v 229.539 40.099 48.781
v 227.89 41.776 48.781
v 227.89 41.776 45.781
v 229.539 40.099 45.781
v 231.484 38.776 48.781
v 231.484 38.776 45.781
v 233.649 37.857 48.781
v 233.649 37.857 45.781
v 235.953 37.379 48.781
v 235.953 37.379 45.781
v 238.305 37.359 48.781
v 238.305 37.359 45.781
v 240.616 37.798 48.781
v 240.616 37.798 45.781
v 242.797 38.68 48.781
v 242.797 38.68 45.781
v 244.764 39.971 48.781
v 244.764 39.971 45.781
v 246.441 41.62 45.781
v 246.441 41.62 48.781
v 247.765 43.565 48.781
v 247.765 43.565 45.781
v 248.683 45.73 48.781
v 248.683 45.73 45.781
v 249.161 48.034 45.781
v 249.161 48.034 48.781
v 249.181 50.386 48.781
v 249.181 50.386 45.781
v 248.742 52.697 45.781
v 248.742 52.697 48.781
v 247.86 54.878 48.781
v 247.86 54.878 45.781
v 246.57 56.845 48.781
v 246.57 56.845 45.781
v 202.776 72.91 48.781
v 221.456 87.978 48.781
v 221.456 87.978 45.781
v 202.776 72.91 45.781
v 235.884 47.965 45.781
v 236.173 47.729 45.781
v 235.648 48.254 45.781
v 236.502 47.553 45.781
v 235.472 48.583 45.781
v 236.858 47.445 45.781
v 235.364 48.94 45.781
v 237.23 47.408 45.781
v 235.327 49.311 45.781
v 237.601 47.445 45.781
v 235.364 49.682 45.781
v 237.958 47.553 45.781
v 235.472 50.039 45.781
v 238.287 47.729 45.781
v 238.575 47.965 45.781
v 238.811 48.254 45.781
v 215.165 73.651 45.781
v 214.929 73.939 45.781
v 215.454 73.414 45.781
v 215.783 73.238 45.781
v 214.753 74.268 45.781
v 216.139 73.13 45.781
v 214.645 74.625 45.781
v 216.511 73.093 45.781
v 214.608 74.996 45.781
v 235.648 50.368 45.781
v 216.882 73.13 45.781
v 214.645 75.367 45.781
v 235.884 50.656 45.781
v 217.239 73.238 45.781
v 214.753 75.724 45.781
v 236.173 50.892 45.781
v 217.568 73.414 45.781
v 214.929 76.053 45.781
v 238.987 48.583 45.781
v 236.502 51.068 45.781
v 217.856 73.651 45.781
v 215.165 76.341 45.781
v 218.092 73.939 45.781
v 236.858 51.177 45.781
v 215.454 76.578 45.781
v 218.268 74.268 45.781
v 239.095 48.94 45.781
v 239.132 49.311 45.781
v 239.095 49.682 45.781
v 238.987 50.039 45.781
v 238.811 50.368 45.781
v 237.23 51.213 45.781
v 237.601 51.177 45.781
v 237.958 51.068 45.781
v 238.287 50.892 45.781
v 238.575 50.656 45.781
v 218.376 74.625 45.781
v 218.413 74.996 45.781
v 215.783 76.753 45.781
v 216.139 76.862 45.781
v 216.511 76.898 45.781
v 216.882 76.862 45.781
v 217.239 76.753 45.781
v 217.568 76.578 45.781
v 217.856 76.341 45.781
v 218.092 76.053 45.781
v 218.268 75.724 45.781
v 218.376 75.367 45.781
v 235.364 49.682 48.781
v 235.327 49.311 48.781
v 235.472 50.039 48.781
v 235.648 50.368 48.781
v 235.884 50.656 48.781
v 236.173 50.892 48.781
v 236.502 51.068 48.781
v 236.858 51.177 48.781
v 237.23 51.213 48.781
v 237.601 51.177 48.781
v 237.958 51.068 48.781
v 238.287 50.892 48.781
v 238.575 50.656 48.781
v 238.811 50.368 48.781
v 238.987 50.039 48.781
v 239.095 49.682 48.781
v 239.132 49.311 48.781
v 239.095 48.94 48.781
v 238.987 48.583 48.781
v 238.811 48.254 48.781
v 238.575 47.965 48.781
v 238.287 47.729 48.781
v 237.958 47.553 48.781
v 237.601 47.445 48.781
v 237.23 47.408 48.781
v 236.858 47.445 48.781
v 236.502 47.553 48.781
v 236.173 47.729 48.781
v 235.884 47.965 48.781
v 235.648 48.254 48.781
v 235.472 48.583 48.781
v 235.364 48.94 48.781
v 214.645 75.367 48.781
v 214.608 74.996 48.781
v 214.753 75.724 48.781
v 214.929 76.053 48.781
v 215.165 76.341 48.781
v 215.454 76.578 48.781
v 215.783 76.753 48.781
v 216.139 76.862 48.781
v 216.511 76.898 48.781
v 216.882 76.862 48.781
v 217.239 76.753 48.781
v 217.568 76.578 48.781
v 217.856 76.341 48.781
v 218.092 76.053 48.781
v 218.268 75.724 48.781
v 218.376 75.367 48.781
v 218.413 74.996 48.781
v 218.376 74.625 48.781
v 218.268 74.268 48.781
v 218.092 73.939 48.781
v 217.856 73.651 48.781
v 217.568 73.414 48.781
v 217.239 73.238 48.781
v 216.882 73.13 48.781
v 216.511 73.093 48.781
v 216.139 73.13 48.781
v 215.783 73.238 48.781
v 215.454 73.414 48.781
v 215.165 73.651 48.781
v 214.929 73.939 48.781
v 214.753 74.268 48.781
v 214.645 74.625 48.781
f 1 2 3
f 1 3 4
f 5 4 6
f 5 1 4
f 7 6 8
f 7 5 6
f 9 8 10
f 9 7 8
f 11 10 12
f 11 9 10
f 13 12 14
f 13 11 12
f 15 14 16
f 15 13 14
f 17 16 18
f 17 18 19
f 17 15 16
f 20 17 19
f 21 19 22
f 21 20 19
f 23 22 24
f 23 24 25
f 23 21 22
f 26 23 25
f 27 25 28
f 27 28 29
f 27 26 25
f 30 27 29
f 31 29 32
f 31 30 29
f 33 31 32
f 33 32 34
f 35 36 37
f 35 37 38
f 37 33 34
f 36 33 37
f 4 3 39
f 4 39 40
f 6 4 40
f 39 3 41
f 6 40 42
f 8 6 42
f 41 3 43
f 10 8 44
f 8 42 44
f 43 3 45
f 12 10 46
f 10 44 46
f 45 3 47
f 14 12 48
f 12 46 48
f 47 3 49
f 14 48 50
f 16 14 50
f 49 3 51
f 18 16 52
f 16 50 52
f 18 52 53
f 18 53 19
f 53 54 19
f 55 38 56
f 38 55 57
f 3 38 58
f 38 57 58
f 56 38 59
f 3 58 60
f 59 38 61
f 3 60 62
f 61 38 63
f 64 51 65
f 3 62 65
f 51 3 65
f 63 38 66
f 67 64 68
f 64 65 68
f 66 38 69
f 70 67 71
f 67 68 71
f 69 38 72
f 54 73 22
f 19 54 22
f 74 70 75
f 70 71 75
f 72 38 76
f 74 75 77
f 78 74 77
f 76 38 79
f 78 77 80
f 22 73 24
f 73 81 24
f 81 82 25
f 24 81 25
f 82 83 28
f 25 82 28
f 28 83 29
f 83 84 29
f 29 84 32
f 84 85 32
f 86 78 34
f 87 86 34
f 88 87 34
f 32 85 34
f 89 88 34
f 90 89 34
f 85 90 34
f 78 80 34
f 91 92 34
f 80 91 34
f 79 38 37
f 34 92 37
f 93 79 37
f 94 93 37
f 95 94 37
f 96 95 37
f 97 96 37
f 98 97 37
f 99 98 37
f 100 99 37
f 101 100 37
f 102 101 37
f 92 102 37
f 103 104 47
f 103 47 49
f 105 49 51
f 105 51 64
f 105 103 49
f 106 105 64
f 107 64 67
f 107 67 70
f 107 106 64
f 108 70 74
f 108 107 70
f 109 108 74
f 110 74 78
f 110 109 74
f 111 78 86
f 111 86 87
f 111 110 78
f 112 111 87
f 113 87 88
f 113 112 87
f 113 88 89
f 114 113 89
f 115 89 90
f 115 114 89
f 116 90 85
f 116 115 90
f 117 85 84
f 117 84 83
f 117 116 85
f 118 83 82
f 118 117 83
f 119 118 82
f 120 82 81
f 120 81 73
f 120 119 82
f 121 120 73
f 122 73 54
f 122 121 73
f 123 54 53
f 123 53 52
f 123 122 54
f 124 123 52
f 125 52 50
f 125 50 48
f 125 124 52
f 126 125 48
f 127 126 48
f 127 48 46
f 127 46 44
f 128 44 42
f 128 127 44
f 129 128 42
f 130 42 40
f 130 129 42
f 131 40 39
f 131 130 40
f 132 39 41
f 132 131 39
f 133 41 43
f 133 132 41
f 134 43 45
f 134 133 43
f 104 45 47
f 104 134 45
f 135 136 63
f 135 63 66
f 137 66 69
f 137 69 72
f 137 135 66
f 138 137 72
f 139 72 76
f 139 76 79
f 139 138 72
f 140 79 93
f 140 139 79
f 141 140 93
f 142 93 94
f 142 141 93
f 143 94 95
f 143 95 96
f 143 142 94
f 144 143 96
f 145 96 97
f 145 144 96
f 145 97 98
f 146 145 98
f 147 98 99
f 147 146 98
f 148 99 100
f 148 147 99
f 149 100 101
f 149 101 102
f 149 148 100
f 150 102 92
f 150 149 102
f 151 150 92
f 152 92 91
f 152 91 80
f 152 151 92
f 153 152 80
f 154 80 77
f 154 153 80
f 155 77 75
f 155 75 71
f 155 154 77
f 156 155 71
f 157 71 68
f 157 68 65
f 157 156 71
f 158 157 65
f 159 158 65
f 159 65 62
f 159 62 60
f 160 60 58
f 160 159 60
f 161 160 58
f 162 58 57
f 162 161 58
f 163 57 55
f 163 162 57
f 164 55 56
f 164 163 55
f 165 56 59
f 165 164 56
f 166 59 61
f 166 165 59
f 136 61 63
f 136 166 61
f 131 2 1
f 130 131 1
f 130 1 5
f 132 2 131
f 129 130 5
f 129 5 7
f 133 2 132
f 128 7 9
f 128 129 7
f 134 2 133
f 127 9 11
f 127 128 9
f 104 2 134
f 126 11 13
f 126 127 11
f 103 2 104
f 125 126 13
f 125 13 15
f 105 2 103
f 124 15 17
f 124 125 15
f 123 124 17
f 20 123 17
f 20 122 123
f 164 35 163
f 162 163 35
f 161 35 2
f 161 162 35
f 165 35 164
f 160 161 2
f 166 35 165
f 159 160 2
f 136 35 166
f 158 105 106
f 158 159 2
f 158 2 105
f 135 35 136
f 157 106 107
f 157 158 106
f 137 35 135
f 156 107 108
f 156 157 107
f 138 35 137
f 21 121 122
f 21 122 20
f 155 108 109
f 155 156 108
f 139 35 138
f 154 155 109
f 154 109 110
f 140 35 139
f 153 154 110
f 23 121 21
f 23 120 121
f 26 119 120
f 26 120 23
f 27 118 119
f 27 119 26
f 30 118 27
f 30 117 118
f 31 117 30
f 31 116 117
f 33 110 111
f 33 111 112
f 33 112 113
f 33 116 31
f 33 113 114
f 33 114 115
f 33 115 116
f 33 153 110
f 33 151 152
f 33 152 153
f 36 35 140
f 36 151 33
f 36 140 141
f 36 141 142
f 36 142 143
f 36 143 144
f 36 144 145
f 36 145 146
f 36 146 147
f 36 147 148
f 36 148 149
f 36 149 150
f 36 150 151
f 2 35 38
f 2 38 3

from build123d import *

# Parameters (mm, degrees)
ESQUISSE1_R        = 1.902389191
BOSS_EXTRU_1_DEPTH = 3


with BuildPart() as part:
    # Esquisse1 → Boss.-Extru.1 (new body)
    with BuildSketch(Plane(origin=(0, 0, 48.781012584), x_dir=(-1, 0, 0), z_dir=(0, 0, -1))):
        with BuildLine():
            Line((-246.569633903, 56.844858091), (-221.455699093, 87.978285117))
            Line((-221.455699093, 87.978285117), (-202.775642878, 72.909924232))
            Line((-202.775642878, 72.909924232), (-227.889577687, 41.776497206))
            ThreePointArc((-227.889577687, 41.776497206), (-244.763786238, 39.970649541), (-246.569633903, 56.844858091))
        make_face()
        with Locations((-237.229605795, 49.310677648)):
            Circle(ESQUISSE1_R, mode=Mode.SUBTRACT)
        with Locations((-216.510609577, 74.995754945)):
            Circle(ESQUISSE1_R, mode=Mode.SUBTRACT)
    extrude(amount=BOSS_EXTRU_1_DEPTH)


solid = part.part
